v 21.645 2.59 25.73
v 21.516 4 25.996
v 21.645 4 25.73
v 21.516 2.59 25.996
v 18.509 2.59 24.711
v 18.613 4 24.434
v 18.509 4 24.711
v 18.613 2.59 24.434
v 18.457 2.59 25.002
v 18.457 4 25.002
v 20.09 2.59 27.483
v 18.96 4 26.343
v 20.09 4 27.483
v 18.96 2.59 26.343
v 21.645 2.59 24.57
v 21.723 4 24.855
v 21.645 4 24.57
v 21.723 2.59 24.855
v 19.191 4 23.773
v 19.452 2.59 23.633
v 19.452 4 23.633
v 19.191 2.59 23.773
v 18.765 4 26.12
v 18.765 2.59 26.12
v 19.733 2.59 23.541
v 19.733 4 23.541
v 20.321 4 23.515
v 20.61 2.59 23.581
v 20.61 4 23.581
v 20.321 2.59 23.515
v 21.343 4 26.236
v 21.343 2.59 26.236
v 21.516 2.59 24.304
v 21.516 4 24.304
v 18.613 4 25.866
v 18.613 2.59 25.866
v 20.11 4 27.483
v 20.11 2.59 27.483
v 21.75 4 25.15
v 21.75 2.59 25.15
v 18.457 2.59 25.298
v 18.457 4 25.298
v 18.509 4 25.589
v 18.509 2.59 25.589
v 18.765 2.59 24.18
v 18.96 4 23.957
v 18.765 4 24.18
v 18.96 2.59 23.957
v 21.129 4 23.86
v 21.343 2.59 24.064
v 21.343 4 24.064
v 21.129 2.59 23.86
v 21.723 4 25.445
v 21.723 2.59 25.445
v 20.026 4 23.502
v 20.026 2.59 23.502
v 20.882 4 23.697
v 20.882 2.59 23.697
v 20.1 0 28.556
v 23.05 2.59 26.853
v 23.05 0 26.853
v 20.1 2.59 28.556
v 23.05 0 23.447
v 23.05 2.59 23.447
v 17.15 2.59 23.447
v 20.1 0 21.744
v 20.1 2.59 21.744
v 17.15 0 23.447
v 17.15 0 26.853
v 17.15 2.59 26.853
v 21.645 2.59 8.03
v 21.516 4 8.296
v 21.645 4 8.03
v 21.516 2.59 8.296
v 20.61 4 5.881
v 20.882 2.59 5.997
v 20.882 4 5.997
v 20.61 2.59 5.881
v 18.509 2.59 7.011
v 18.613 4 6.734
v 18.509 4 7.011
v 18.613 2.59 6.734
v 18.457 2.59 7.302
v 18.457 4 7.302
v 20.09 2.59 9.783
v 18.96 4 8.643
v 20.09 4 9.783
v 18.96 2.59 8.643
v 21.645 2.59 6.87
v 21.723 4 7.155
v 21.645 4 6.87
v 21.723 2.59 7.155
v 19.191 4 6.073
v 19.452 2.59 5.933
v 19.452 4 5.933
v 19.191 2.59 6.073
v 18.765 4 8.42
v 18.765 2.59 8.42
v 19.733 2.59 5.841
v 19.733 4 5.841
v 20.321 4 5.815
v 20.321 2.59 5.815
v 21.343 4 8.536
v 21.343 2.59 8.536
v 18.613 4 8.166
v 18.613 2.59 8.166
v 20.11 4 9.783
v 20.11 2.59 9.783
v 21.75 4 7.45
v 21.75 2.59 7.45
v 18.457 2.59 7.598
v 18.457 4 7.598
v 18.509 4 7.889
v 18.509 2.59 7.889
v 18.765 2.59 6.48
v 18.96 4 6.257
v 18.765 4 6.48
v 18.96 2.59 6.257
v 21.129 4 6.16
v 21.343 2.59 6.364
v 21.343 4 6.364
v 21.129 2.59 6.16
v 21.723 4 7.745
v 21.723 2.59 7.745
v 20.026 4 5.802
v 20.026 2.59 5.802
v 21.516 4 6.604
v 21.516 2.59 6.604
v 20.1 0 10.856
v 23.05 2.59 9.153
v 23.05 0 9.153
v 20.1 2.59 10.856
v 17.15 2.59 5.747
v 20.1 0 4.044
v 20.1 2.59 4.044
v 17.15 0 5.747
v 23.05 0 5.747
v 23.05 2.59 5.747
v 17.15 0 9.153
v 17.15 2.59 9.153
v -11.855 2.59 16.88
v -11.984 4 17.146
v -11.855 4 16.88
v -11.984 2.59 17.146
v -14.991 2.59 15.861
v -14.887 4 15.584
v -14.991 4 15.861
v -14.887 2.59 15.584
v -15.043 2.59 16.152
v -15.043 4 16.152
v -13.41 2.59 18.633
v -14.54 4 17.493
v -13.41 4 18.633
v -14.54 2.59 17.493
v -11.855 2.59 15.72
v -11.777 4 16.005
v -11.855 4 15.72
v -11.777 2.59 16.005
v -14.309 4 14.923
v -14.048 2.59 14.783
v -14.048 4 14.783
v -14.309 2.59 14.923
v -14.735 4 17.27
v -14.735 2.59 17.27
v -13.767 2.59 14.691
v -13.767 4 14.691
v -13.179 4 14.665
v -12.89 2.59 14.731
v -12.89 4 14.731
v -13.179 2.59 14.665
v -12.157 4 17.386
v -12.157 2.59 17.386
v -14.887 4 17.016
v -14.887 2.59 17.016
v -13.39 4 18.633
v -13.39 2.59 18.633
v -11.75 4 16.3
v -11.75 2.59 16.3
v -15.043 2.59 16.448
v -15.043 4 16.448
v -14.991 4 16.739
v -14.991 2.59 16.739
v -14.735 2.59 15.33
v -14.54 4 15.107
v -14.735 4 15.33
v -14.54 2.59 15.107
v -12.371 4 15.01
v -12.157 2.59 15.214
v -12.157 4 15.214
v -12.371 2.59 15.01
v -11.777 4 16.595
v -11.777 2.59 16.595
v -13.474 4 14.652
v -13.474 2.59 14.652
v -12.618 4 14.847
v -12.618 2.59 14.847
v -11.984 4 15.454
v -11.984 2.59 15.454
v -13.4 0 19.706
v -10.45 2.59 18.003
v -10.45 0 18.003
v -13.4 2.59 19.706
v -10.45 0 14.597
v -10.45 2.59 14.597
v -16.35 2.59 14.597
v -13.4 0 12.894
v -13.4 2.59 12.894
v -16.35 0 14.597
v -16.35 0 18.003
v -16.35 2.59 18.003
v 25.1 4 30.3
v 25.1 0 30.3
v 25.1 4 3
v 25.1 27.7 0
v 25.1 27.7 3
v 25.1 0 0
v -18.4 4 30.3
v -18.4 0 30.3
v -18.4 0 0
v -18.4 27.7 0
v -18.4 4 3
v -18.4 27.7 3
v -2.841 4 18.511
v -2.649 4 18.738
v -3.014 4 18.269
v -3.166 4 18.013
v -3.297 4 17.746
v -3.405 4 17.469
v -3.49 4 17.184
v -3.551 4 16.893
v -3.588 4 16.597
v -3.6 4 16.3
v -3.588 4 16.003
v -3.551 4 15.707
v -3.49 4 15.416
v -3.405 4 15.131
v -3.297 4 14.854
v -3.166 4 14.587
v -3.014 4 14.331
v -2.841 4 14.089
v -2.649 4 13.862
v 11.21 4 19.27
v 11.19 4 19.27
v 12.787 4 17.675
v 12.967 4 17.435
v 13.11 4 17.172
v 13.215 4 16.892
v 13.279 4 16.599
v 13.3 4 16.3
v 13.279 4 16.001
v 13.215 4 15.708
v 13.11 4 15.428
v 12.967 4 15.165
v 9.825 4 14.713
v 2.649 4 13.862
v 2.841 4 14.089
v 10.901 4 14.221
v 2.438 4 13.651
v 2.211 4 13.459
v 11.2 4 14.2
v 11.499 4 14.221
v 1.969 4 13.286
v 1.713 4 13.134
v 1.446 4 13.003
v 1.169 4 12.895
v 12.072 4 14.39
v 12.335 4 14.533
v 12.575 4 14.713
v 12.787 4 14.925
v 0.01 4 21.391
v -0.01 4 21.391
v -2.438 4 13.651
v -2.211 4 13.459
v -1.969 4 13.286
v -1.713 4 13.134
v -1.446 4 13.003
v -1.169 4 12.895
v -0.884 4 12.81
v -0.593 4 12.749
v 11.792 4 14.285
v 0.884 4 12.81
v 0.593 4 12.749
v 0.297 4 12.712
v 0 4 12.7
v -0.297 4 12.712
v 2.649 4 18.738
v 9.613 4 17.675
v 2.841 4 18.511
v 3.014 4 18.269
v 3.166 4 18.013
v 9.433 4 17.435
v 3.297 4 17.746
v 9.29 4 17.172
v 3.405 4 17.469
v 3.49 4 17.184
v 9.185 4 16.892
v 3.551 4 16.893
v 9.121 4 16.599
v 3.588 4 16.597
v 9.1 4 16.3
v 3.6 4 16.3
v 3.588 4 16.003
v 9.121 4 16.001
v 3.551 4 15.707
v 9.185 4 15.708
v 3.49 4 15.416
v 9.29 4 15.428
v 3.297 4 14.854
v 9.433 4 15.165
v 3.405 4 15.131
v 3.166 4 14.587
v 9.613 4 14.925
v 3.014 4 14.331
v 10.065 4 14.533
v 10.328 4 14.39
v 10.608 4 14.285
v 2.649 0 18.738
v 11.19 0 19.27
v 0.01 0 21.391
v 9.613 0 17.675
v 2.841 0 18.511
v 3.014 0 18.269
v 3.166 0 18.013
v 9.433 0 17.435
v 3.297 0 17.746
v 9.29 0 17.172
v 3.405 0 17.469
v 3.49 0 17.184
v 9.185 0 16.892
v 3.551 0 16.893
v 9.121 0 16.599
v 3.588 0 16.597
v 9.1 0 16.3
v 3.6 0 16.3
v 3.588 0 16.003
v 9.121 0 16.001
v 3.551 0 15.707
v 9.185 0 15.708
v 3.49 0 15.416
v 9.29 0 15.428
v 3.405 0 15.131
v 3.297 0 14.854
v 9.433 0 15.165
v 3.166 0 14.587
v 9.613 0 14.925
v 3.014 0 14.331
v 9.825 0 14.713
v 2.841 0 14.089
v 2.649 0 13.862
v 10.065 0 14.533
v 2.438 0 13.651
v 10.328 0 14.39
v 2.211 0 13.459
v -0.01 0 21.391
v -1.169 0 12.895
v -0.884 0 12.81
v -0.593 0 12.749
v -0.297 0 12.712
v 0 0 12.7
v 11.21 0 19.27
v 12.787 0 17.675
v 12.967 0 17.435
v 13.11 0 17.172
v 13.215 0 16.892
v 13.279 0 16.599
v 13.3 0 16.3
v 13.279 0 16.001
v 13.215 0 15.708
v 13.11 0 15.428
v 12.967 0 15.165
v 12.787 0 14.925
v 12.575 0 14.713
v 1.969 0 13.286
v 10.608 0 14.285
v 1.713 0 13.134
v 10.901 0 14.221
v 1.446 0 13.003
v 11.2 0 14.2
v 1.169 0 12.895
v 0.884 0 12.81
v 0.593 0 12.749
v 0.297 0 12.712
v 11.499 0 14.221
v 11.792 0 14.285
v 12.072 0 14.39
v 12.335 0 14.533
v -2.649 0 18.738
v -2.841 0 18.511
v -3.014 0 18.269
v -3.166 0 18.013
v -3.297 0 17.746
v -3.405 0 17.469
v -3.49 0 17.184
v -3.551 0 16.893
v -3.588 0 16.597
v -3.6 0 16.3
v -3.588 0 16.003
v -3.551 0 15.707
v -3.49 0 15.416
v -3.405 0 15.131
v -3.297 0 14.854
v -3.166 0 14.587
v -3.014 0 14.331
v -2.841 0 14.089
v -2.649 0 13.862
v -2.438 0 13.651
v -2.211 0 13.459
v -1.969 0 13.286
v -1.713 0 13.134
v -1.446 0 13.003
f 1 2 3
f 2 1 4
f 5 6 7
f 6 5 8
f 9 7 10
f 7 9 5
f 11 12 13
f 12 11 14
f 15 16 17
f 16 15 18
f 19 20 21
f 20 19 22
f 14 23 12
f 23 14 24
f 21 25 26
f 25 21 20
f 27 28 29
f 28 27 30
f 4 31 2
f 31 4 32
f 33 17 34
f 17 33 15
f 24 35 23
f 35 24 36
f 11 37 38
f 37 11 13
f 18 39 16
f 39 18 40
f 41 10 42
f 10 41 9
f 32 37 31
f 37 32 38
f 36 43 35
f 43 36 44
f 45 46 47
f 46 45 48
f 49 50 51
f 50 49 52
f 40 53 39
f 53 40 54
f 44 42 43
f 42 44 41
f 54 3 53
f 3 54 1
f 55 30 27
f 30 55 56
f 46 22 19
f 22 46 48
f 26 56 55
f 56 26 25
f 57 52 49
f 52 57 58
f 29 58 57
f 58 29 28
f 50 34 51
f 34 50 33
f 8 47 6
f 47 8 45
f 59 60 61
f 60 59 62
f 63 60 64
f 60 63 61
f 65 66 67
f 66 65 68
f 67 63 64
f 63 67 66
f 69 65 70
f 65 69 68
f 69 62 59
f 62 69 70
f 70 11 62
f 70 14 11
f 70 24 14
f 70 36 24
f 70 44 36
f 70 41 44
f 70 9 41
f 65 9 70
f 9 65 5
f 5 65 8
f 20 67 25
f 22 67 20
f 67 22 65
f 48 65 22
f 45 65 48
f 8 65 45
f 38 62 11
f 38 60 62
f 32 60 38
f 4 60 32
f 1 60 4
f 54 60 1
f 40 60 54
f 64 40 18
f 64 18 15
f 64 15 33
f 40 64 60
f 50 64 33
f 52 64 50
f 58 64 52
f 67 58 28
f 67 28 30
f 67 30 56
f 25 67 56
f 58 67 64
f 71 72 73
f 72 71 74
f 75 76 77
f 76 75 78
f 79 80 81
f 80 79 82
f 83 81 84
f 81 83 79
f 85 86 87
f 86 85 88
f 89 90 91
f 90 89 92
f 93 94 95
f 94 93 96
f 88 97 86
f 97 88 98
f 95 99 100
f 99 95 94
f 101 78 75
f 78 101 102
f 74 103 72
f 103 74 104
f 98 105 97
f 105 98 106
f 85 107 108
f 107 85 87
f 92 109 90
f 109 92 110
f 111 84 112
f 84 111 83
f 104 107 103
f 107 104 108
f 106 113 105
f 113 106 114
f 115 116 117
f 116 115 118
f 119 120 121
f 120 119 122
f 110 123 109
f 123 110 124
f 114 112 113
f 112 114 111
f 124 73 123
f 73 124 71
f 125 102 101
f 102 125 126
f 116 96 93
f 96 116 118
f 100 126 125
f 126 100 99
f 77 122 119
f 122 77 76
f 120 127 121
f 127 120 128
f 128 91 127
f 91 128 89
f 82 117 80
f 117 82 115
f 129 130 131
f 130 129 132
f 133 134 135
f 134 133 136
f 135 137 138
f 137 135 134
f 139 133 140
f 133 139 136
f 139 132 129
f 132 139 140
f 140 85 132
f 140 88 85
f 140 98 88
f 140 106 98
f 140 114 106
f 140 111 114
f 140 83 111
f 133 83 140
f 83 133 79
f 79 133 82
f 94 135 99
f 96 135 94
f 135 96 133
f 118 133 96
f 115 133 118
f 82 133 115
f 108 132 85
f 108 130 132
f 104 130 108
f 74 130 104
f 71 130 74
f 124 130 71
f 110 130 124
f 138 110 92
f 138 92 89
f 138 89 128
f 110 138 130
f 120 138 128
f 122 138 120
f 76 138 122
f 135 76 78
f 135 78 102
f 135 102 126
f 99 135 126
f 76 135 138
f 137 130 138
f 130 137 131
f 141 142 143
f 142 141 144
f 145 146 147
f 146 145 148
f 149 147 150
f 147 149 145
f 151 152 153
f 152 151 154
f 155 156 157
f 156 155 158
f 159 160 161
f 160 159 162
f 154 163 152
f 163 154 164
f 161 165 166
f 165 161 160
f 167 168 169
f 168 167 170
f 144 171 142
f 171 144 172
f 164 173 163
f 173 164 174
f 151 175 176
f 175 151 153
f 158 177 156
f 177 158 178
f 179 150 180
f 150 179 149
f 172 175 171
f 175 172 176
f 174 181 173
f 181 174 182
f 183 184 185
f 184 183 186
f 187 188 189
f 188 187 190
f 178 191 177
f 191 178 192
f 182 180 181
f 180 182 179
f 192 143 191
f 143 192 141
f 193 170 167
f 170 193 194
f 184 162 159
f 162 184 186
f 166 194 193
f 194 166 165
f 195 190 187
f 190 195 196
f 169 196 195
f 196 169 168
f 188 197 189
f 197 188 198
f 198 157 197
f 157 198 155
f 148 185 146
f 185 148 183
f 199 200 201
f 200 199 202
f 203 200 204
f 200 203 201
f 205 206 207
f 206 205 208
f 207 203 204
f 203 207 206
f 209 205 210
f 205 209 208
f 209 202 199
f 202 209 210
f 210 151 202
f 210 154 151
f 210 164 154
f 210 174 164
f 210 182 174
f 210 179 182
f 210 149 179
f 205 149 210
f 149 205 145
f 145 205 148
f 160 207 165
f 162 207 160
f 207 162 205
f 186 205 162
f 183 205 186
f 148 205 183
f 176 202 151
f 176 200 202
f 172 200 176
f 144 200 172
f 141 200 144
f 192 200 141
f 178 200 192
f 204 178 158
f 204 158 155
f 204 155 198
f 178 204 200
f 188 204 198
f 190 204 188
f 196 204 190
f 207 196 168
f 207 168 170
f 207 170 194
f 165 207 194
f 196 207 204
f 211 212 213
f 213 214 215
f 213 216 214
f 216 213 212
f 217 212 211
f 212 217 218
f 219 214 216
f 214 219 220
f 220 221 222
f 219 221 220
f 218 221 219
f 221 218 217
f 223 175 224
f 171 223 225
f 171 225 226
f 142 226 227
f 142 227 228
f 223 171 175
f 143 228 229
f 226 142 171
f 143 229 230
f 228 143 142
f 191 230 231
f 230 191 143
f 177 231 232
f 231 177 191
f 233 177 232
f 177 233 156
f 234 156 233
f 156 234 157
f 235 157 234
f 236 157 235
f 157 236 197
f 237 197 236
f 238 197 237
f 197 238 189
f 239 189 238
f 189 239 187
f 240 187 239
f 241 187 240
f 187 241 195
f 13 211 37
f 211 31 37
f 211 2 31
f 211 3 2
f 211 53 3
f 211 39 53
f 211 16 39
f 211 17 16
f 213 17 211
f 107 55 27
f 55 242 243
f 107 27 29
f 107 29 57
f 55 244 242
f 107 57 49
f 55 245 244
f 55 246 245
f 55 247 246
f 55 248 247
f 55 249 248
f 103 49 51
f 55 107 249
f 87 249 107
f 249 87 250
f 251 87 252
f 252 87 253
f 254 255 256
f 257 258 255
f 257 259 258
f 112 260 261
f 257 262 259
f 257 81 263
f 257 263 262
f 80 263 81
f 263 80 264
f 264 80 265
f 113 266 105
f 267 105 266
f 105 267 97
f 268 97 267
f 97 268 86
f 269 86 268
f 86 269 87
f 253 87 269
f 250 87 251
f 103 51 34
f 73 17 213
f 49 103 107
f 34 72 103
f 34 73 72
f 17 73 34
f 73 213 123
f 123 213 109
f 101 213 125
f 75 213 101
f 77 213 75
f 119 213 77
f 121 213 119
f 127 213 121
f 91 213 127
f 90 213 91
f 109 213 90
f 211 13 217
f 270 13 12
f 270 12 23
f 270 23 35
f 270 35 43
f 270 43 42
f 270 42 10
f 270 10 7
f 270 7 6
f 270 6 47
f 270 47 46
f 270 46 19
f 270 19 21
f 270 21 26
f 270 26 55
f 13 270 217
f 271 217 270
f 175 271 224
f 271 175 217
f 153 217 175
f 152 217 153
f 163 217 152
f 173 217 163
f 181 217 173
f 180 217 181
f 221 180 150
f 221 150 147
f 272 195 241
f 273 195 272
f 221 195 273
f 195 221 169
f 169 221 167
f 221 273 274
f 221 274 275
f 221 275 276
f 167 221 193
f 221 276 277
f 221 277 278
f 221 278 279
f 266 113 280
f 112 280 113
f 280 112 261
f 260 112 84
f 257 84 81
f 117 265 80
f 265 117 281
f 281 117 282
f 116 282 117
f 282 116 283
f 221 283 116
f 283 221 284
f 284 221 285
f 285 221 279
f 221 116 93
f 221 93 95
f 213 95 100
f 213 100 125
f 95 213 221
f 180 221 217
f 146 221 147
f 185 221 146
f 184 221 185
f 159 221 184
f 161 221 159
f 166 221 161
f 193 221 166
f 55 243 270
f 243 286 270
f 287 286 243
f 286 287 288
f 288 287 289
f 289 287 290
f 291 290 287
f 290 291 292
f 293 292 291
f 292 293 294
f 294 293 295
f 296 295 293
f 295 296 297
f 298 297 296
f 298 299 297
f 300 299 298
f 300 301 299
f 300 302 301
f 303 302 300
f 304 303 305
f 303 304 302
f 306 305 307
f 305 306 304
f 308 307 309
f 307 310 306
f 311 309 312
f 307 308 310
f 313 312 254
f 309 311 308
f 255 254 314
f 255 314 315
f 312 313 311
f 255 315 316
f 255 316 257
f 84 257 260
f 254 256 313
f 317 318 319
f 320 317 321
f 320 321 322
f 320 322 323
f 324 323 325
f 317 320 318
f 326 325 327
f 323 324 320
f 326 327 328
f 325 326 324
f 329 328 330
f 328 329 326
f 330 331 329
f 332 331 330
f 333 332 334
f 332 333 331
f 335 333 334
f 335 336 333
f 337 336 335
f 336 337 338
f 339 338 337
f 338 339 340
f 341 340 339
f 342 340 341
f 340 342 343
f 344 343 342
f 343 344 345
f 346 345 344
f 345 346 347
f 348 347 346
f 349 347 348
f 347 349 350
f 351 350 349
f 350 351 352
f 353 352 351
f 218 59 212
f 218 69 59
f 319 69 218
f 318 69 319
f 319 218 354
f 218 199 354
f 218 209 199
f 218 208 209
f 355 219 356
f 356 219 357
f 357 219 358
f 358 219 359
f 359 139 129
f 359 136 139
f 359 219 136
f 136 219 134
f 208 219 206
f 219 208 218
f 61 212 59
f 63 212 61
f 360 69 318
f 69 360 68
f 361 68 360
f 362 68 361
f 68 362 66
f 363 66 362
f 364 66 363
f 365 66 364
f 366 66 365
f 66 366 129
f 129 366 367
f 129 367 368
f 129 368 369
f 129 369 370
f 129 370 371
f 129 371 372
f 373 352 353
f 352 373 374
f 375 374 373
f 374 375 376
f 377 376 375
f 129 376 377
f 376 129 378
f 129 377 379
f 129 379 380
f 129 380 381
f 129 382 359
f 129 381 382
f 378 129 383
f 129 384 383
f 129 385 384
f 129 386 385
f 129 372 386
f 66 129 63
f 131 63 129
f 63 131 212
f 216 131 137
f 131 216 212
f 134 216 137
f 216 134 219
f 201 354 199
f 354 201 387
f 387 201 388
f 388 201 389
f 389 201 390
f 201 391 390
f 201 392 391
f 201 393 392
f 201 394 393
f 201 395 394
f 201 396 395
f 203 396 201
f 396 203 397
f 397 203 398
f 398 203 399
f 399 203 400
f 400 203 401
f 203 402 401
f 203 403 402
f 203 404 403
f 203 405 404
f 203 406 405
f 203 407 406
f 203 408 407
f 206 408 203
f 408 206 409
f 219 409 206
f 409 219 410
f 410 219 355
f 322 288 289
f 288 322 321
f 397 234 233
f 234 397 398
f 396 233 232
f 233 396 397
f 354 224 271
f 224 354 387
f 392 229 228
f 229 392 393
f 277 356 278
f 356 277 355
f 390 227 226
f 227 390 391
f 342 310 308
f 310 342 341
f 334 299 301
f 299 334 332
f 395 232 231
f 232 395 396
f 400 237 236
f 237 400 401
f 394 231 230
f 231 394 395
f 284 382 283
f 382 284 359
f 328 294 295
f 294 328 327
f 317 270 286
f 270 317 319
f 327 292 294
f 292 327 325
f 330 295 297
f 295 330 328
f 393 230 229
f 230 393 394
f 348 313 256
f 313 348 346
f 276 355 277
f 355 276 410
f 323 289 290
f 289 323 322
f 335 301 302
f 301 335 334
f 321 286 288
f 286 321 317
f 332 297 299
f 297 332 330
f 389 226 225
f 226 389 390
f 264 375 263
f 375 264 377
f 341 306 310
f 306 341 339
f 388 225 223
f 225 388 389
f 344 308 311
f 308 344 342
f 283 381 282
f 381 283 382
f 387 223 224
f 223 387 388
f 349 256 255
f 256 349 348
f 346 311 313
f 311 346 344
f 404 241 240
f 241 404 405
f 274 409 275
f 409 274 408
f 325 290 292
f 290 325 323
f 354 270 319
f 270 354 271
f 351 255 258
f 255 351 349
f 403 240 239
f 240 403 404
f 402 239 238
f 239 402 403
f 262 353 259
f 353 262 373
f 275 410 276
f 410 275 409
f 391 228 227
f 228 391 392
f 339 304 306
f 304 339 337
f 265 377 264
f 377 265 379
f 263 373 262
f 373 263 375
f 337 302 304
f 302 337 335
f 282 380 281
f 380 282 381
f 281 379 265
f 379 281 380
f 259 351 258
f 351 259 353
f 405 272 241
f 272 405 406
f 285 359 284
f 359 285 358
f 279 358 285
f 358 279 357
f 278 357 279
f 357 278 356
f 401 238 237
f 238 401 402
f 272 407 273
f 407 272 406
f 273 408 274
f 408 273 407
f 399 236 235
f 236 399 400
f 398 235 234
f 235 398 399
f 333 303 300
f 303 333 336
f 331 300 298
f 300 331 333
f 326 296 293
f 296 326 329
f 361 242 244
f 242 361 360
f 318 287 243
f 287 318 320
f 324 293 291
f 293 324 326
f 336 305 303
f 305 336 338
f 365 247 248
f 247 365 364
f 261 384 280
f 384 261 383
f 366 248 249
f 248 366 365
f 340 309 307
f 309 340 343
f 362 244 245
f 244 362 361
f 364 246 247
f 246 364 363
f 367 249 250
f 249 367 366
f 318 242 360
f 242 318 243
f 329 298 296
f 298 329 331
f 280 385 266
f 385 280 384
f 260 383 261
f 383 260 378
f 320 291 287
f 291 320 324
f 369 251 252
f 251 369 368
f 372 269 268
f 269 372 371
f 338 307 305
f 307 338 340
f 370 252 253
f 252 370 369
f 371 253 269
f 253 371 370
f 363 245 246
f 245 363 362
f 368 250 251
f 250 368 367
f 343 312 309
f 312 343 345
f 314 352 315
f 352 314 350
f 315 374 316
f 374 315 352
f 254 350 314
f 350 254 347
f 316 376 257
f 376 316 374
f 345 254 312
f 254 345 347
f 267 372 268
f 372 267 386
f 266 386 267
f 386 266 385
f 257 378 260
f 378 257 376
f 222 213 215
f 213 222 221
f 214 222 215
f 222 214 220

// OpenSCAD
// file: ../vehicle/barrel.scad
// IR gun barrel: thick-wall tube, LED seated coaxially at the rear, held by a rear cap.
// Modeled in print orientation: axis on Z, muzzle on the bed at z = 0, rear at z = len.
// The LED goes in from the rear, its flange stops on a step, and the cap presses it there.

include <../lib/common.scad>
include <../lib/parts.scad>

barrel_len = 60;
barrel_bore_d = 5.0;
barrel_od = 14;
barrel_cap_d = 9;
barrel_cap_h = 3;
barrel_wire_slot = [4.0, 2.0];

function barrel_od() = barrel_od;

// Longer than the LED body so the flange, not the dome, is the stop.
led_seat_len = led_h - led_flange_h + 0.5;

module barrel(len = barrel_len, bore_d = barrel_bore_d, od = barrel_od, seat_cl = clearance) {
    assert(od - barrel_cap_d >= 2 * wall_min, "barrel wall around the cap is too thin");
    assert(len > barrel_cap_h + led_flange_h + led_seat_len + 5, "barrel too short for the LED seat");
    difference() {
        cylinder(d = od, h = len);
        barrel_bore(len, bore_d, seat_cl);
    }
}

// Kept separate so baffles or a muzzle aperture can be added here later.
module barrel_bore(len, bore_d, seat_cl) {
    flange_z = len - barrel_cap_h - led_flange_h;
    hole(bore_d, len, cl = 0);
    translate([0, 0, flange_z - led_seat_len]) cylinder(d = led_d + seat_cl, h = led_seat_len + eps);
    translate([0, 0, flange_z]) cylinder(d = led_flange_d + seat_cl, h = led_flange_h + eps);
    translate([0, 0, len - barrel_cap_h]) cylinder(d = barrel_cap_d + clearance, h = barrel_cap_h + eps);
}

// Printed flat side down; that face presses on the LED flange.
module barrel_cap() {
    difference() {
        cylinder(d = barrel_cap_d, h = barrel_cap_h);
        translate([0, 0, barrel_cap_h / 2])
            cube([barrel_wire_slot.x, barrel_wire_slot.y, barrel_cap_h + 1], center = true);
    }
}

barrel();
translate([barrel_od + 5, 0, 0]) barrel_cap();
// file: ../lib/pcb_vehicle.scad
// Generated by shield/tools/brd2scad.py from eagle/ir_remote_controlled_veh.brd. Do not edit; run `make pcb`.
// Units mm. Origin = lower-left corner of the board outline. +Y = Eagle +Y.

pcb_vehicle_eagle_origin = [-2.54, -3.81];
pcb_vehicle_size = [98.73, 99.558];
pcb_vehicle_outline = [[0, 0], [98.73, 0], [98.73, 99.558], [0, 99.558]];

// [name, x, y, drill]
pcb_vehicle_holes = [
  ["H1", 90.17, 91.44, 2.8],
  ["H2", 7.62, 10.16, 2.8],
];

// [name, package, value, x, y, rot, mirrored, [x0, y0, x1, y1] footprint box]
pcb_vehicle_parts = [
  ["7SEG", "BA56-12EWA", "", 77.47, 80.01, 0, false, [66.358, 71.438, 89.853, 83.503]],
  ["B1", "KEYSTONE_1049_DUAL_18650_HOLDER", "KEYSTONE_DUAL_18650_BATTERY_HOLDER", 53.721, 20.955, 0, false, [15.091, 0.955, 92.351, 40.955]],
  ["BATTERY", "LED5MM", "", 63.5, 49.53, 90, false, [60.884, 46.914, 66.116, 52.197]],
  ["C1", "C025-040X050", "22uF", 13.97, 90.17, 90, false, [11.989, 87.681, 15.951, 92.659]],
  ["IC1", "DIL14", "74ALS08N", 52.07, 91.44, 0, false, [43.104, 86.919, 61.036, 95.961]],
  ["IC2", "DIL16", "74HC595N", 77.47, 60.96, 180, false, [67.234, 56.439, 87.706, 65.481]],
  ["IC3", "DIL16", "L293D", 19.05, 67.31, 270, false, [14.529, 57.074, 23.571, 77.546]],
  ["IR", "LED5MM", "", 55.88, 60.96, 0, false, [53.264, 58.344, 58.547, 63.576]],
  ["NRF24L", "NRF24L01+", "NRF24L01+", 22.86, 102.87, 90, false, [17.082, 89.471, 32.449, 118.809]],
  ["R1", "0204/7", "180", 54.61, 68.58, 0, false, [50.089, 67.488, 59.131, 69.672]],
  ["R2", "0204/7", "180", 54.61, 71.12, 0, false, [50.089, 70.028, 59.131, 72.212]],
  ["R3", "0204/7", "180", 54.61, 73.66, 0, false, [50.089, 72.568, 59.131, 74.752]],
  ["R4", "0204/7", "30K", 17.78, 52.07, 0, false, [13.259, 50.978, 22.301, 53.162]],
  ["R5", "0204/7", "30K", 17.78, 48.26, 0, false, [13.259, 47.168, 22.301, 49.352]],
  ["R6", "0204/7", "160", 53.34, 50.8, 0, false, [48.819, 49.708, 57.861, 51.892]],
  ["R7", "0204/7", "160", 53.34, 55.88, 0, false, [48.819, 54.788, 57.861, 56.972]],
  ["R8", "0204/7", "100", 53.34, 53.34, 0, false, [48.819, 52.248, 57.861, 54.432]],
  ["S1", "TL3XPO", "TL38PO", 10.16, 31.75, 270, false, [7.518, 26.568, 12.802, 36.932]],
  ["SG1", "F/CM12P", "F/CM12P", 88.9, 49.53, 270, false, [81.839, 42.469, 95.961, 56.591]],
  ["SV1", "MA04-1", "", 7.62, 80.01, 270, false, [6.274, 74.854, 8.966, 85.166]],
  ["TSOP1", "TSOP17XX", "TSOP1730", 68.58, 95.25, 180, false, [63.597, 93.281, 73.724, 97.409]],
  ["TSOP2", "TSOP17XX", "TSOP1730", 68.58, 90.17, 0, false, [63.437, 88.011, 73.564, 92.139]],
  ["U$1", "NANO", "", 40.64, 54.61, 0, false, [29.769, 45.009, 46.431, 81.991]],
];
// file: ../vehicle/gun_block.scad
// Gun block: raked block with the barrel bore, the TSOP pair seat on top and the wall
// as its rear part. Modeled in assembly orientation: x = 0 on the barrel axis, y = 0
// at the wall rear face, z = 0 on the base plate top. Printed on the wall rear face,
// so the barrel bore is vertical and round.
// The barrel slides in from the front until its rear end is flush with the wall rear
// face (press the block rear on the table). It is held by friction (barrel_fit_cl).

include <../lib/common.scad>
include <../lib/parts.scad>
use <barrel.scad>

// As wide as the caster spacer below the plate, so the two read as one nose.
block_w = caster_plate.x;
block_h = 40;
// Flat top for the TSOP pair, from the wall rear face; the front face leans back by block_rake.
block_top_len = 20;
block_rake = 30;
// Wall: full plate width, sides sloping down to wall_side_h.
wall_w = 100;
wall_t = 4;
wall_side_h = 15;
// Foot on the plate for the M3 screws; nuts go under the base plate.
flange_t = 3;
flange_len = 12;
flange_front_w = 84;
flange_hole_x = [25, 40];
flange_hole_y = 8;
barrel_axis_z = 15;
barrel_fit_cl = 0.2;
tsop = tsop1730;
tsop_seat_depth = 5;
// Under the lens ends of the pair; the bodies rest on it, the legs go down between.
tsop_ledge = 2;
// [width, height] of the wire channel from the TSOP legs out of the wall rear face.
tsop_wire_channel = [6, 5];
// Dome radius is 2.75; the whole lens must stay above the block top.
min_lens_above_top = 3.5;

block_len = block_top_len + block_h * tan(block_rake);
bore_d = barrel_od() + barrel_fit_cl;
tsop_y = block_top_len / 2;
tsop_floor_z = block_h - tsop_seat_depth;
wire_z = barrel_axis_z + bore_d / 2 + wall_min;

function gun_block_len() = block_len;
function gun_block_wall_w() = wall_w;
function gun_block_wall_t() = wall_t;
function gun_block_barrel_z() = barrel_axis_z;
function gun_block_tsop_seat() = [0, tsop_y, tsop_floor_z];
function gun_block_holes() = [for (sx = [-1, 1], x = flange_hole_x) [sx * x, flange_hole_y]];

assert(tsop_lens_h(tsop) - tsop_seat_depth >= min_lens_above_top, "TSOP seat too deep, lens would be covered");
assert(tsop_y + (2 * tsop_depth(tsop) + clearance) / 2 + wall_min <= block_top_len, "TSOP pocket does not fit the flat top");
assert(bore_d + 2 * wall_min <= block_w, "block too narrow for the barrel");
assert(barrel_axis_z - bore_d / 2 >= wall_min, "barrel bore too low");
assert(wire_z + tsop_wire_channel.y <= tsop_floor_z - wall_min, "no room for the TSOP wires above the barrel");
echo(block_len = block_len, tsop_legs_max = tsop_floor_z - wire_z, lens_above_top = tsop_lens_h(tsop) - tsop_seat_depth);

// Top face at z = 0, pair centred on the origin, legs straight down into the cavity.
module tsop_seat_cut(t = tsop, depth = tsop_seat_depth, cavity_h = 10, ledge = tsop_ledge) {
    pocket = [tsop_w(t) + clearance, 2 * tsop_depth(t) + clearance];
    cavity = [pocket.x, pocket.y - 2 * ledge];
    assert(tsop_pin_back(t) + 0.5 <= cavity.y / 2, "ledge covers the legs");
    translate([-pocket.x / 2, -pocket.y / 2, -depth]) cube([pocket.x, pocket.y, depth + eps]);
    translate([-cavity.x / 2, -cavity.y / 2, -depth - cavity_h]) cube([cavity.x, cavity.y, cavity_h + eps]);
}

module gun_block() {
    difference() {
        union() {
            hull() {
                translate([-block_w / 2, 0, 0]) cube([block_w, block_len, eps]);
                translate([-block_w / 2, 0, block_h - eps]) cube([block_w, block_top_len, eps]);
            }
            translate([0, wall_t, 0]) rotate([90, 0, 0]) linear_extrude(wall_t) polygon([
                [-wall_w / 2, 0], [wall_w / 2, 0], [wall_w / 2, wall_side_h],
                [block_w / 2, block_h], [-block_w / 2, block_h], [-wall_w / 2, wall_side_h],
            ]);
            linear_extrude(flange_t) polygon([
                [-wall_w / 2, 0], [wall_w / 2, 0], [wall_w / 2, wall_t],
                [flange_front_w / 2, flange_len], [-flange_front_w / 2, flange_len], [-wall_w / 2, wall_t],
            ]);
        }
        translate([0, -eps, barrel_axis_z]) rotate([-90, 0, 0]) cylinder(d = bore_d, h = block_len + 2 * eps);
        translate([0, tsop_y, block_h]) tsop_seat_cut(cavity_h = tsop_floor_z - wire_z);
        translate([-tsop_wire_channel.x / 2, -eps, wire_z]) cube([tsop_wire_channel.x, tsop_y + eps, tsop_wire_channel.y]);
        // Teardrop tip points +Y, which is up when printed on the wall rear face.
        for (sx = [-1, 1], x = flange_hole_x)
            translate([sx * x, flange_hole_y, flange_t]) rotate([-90, 0, 0]) teardrop(m3_d, flange_t, m3_cl);
    }
}

rotate([90, 0, 0]) gun_block();
// file: ../lib/vehicle_layout.scad
// Vehicle layout shared by the vehicle parts and the preview. Values only, no geometry.
// PCB coordinates: origin at the PCB outline lower-left corner, +Y front, z = 0 on the
// base plate top.

include <common.scad>
include <parts.scad>
include <pcb_vehicle.scad>
use <../vehicle/gun_block.scad>

// The barrel sticks out in front of the plate, so only the plate is limited (by the bed).
plate_size = [100, 170];
plate_x0 = (pcb_vehicle_size.x - plate_size.x) / 2;
// Shorter than on the prototype (48) so the nose starts in front of the gun block wall.
nose_len = 39;
// Motor wall length past the outer motor holes.
motor_wall_margin = 5;
// As far back as it goes with the motor walls ending at the plate rear edge.
axle_y = motor_wall_margin - tt_holes[2][0];
// Front face of the caster spacer leans back going down, as on the prototype.
caster_spacer_rake = 30;
// Gun block wall rear face must stay in front of the NRF24 module.
nrf_gap = 1.0;

// PCB rests at the two corners without holes (no solder joints there), mirrored from H1 and H2.
// [diameter, length] of the rest peg that locates it in the plate.
pcb_rest_peg = [3, 2];

centre_x = plate_x0 + plate_size.x / 2;
pcb_rest_points = [
    [pcb_vehicle_holes[0][1], pcb_vehicle_holes[1][2]],
    [pcb_vehicle_holes[1][1], pcb_vehicle_holes[0][2]],
];
// The gun block on top and the caster spacer below both end at the plate front edge, as a
// nose; the plate front is as wide as both.
nose_front_w = caster_plate.x;
block_y = plate_size.y - gun_block_len();
caster_y = plate_size.y - caster_spacer_h * tan(caster_spacer_rake) - caster_plate.y / 2;

assert(block_y >= pcb_part(pcb_vehicle_parts, "NRF24L")[7][3] + nrf_gap, "gun block wall hits the NRF24 module");
// file: ../vehicle/base_plate.scad
// Vehicle base plate with the TT motor walls and the caster spacer in one piece.
// Modeled in assembly orientation (see lib/vehicle_layout.scad). Printed top face down, so the
// motor walls and the caster spacer grow up from the bed without supports.
// PCB and gun block: M3 screws from the top, nuts in traps in the plate bottom.
// PCB standoffs and rests are separate (pcb_standoff.scad); the rests sit in blind holes.
// Caster: self-tapping screws from below into blind pilot holes in the spacer.

include <../lib/vehicle_layout.scad>
use <gun_block.scad>

motor_wall_t = 4;
// [x, y] size of the motor wire slots, in front of the PCB, in line with each motor.
wire_slot = [5, 10];
wire_slot_y = 104;
// For the 10 mm caster screws (user value).
caster_pilot_d = 2;
caster_pilot_depth = 10;
// A thin ring slit around each pilot hole makes the slicer print walls on both sides of
// it, so the screw bites into solid plastic instead of infill.
caster_slit_r = caster_pilot_d / 2 + 1.6;
caster_slit_w = 0.15;

motor_wall_h = motor_top_gap + tt_w + 3;

// Motor wall in its own frame, the same as test/tt_motor_mount: x along the motor from
// the shaft towards the motor end, wall at y 0..motor_wall_t with the motor on +Y and
// the nuts on -Y, z = 0 on the plate top and growing down into the plate and the wall.
module tt_motor_wall() {
    x0 = tt_holes[2][0] - motor_wall_margin;
    x1 = tt_holes[0][0] + motor_wall_margin;
    shaft_z = base_plate_t + motor_top_gap + tt_top_above_axle;
    difference() {
        translate([x0, 0, 0]) cube([x1 - x0, motor_wall_t, base_plate_t + motor_wall_h]);
        for (h = tt_holes) translate([h[0], 0, shaft_z + h[1]]) {
            teardrop(m3_d, motor_wall_t, m3_cl);
            translate([0, -eps, 0]) rotate([-90, 0, 0]) nut_trap(m3_nut_af, m3_nut_h + clearance, m3_nut_cl);
        }
        translate([0, 0, shaft_z]) teardrop(tt_boss_d + 1.5, motor_wall_t);
        translate([tt_peg[0], 0, shaft_z + tt_peg[1]]) teardrop(tt_peg_d, motor_wall_t);
    }
}

module plate_outline() {
    nose_y = plate_size.y - nose_len;
    polygon([
        [0, 0], [plate_size.x, 0], [plate_size.x, nose_y],
        [(plate_size.x + nose_front_w) / 2, plate_size.y],
        [(plate_size.x - nose_front_w) / 2, plate_size.y], [0, nose_y],
    ]);
}

// As long as the gun block above, so the two read as one nose. Top at z = 0 (plate
// underside), caster face at z = -caster_spacer_h.
caster_spacer_nose = caster_spacer_h * tan(caster_spacer_rake);
module caster_spacer() {
    hull() {
        translate([-caster_plate.x / 2, block_y, -caster_spacer_h]) cube([caster_plate.x, plate_size.y - caster_spacer_nose - block_y, eps]);
        translate([-caster_plate.x / 2, block_y, -eps]) cube([caster_plate.x, plate_size.y - block_y, eps]);
    }
}

function caster_holes() = [for (sx = [-1, 1], sy = [-1, 1])
    [centre_x + sx * caster_hole_spacing.x / 2, caster_y + sy * caster_hole_spacing.y / 2]];

module caster_screw_cut(p) {
    translate([p.x, p.y, -base_plate_t - caster_spacer_h]) {
        hole(caster_pilot_d, caster_pilot_depth, 0);
        difference() {
            hole(2 * caster_slit_r + caster_slit_w, caster_pilot_depth, 0);
            hole(2 * caster_slit_r - caster_slit_w, caster_pilot_depth, eps);
        }
    }
}

module bottom_nut_trap(x, y) {
    translate([x, y, -base_plate_t]) {
        hole(m3_d, base_plate_t, m3_cl);
        nut_trap(m3_nut_af, base_plate_t - nut_roof, m3_nut_cl);
    }
}

module base_plate() {
    difference() {
        union() {
            translate([plate_x0, 0, -base_plate_t]) linear_extrude(base_plate_t) plate_outline();
            for (side = [-1, 1]) {
                inner_x = side < 0 ? plate_x0 + tt_t + motor_wall_t : plate_x0 + plate_size.x - tt_t - motor_wall_t;
                multmatrix([[0, side, 0, inner_x], [1, 0, 0, axle_y], [0, 0, -1, 0]]) tt_motor_wall();
            }
            translate([centre_x, 0, -base_plate_t]) caster_spacer();
        }
        for (h = pcb_vehicle_holes) bottom_nut_trap(h[1], h[2]);
        for (p = pcb_rest_points) translate([p.x, p.y, -pcb_rest_peg[1] - 0.5])
            cylinder(d = pcb_rest_peg[0] + clearance, h = pcb_rest_peg[1] + 0.5 + eps);
        for (p = gun_block_holes()) bottom_nut_trap(centre_x + p.x, block_y + p.y);
        for (p = caster_holes()) caster_screw_cut(p);
        for (x = [plate_x0 + tt_t / 2, plate_x0 + plate_size.x - tt_t / 2])
            translate([x - wire_slot.x / 2, wire_slot_y, -base_plate_t - eps]) cube([wire_slot.x, wire_slot.y, base_plate_t + 2 * eps]);
    }
}

assert(plate_size.x <= bed_size.x && plate_size.y <= bed_size.y, "plate larger than the bed");
assert(gun_block_wall_w() <= plate_size.x, "gun block wall wider than the plate");
assert(plate_size.y - nose_len >= block_y + gun_block_wall_t(), "plate nose cuts under the gun block wall");
assert(caster_y - caster_plate.y / 2 >= block_y, "caster plate overhangs the spacer rear end");
assert(block_y + gun_block_len() <= plate_size.y, "gun block overhangs the plate front");
assert(wire_slot_y > pcb_vehicle_size.y && wire_slot_y + wire_slot.y < block_y, "wire slot not between the PCB and the gun block");
assert(caster_pilot_depth <= caster_spacer_h + base_plate_t - 1, "caster pilot hole breaks through the plate top");
echo(caster_screw_max = caster_plate_t + caster_pilot_depth, caster_slit_d = 2 * caster_slit_r);
echo(plate_underside_h = plate_underside_h, caster_spacer_h = caster_spacer_h, motor_wall_h = motor_wall_h);

rotate([180, 0, 0]) base_plate();
// file: ../lib/parts.scad
// Off-the-shelf part sizes and simple ghost models for previews. Units mm.
// docs/measurements.md is the source of truth for every value here, with its source
// and status. Change both together. "unverified" values are not final.

// Mounted with the long axis horizontal and the 22.3 width vertical.
// Local frame of tt_motor_ghost(): shaft on the X axis, gearbox end towards -Y.
tt_len = 64.4;
tt_w = 22.3;
tt_clip_w = 22.6;
tt_t = 18.7;
tt_shaft_from_end = 11.0;
tt_shaft_d = 5.4;
tt_shaft_len = 9.1;
tt_boss_d = 5.5;
tt_hole_d = 2.8;
// [along length from shaft, across width from shaft]
tt_holes = [[20.1, 8.85], [20.1, -8.85], [-13.4, 0]];
tt_tab_len = 5.0;
tt_tab_w = 5.7;
// Round peg on the gearbox side, estimated from the drawing scale.
tt_peg = [11.2, 0];
tt_peg_d = 4.0;
tt_top_above_axle = max(tt_w, tt_clip_w) / 2;

wheel_d = 65;
wheel_w = 26;

caster_h = 35;
caster_wheel_d = 25;
caster_hole_d = 5;
caster_hole_spacing = [28, 23];
caster_plate = [40, 34];
caster_plate_t = 2;

// Plate underside height; the caster must reach the same height. Recompute after
// measuring wheel_d, tt_top_above_axle, motor_top_gap and caster_h.
// On the prototype an aluminium angle flange sits between plate and motor (photo
// estimate). The gap also keeps the top motor nut trap clear of the plate.
motor_top_gap = 2;
plate_underside_h = wheel_d / 2 + tt_top_above_axle + motor_top_gap;
caster_spacer_h = plate_underside_h - caster_h;

led_d = 5.0;
led_flange_d = 5.8;
led_flange_h = 1.0;
led_h = 8.6;
led_lead_pitch = 2.54;

// IR receivers: [body w, body h, depth incl. lens, lens centre above body bottom,
//     outer pin spacing, pins from back face]
tsop1730 = [10.0, 12.5, 5.8, 9.2, 7.62, 1.4];
// Upgrade option only (docs/hardware-upgrades.md). Lens height and pin offset are guesses.
tsop38238 = [5.0, 6.95, 4.8, 4.5, 5.08, 1.0];
function tsop_w(t) = t[0];
function tsop_h(t) = t[1];
function tsop_depth(t) = t[2];
function tsop_lens_h(t) = t[3];
function tsop_pin_span(t) = t[4];
function tsop_pin_back(t) = t[5];

btn_hole_d = 24;
btn_bezel_d = 30;
btn_above_panel = 10;
btn_depth = 33;
btn_nut_d = 30;

switch_body = [8.6, 3.6, 3.5];
switch_lever = [2.0, 2.0, 4.0];
switch_travel = 2.0;

cell_d = 18.5;
cell_len = 65.2;

joystick_cap_top = 32;
joystick_cap_d = 25;

// Height above the PCB top per Eagle package, for previews and clearance.
pcb_part_heights = [
    ["KEYSTONE_1049_DUAL_18650_HOLDER", 20],
    ["SINGLE_18650_HOLDER", 20],
    ["NRF24L01+", 13],
    ["NANO", 11],
    ["BA56-12EWA", 8],
    ["DIL14", 7],
    ["DIL16", 7],
    ["F/CM12P", 9.5],
    ["JOYSTICK-2AXIS-BUTTON", 17],
    ["DC-DC-STEP-UP-5V", 7],
    ["TL3XPO", 3.5],
];
function pcb_part_height(package) =
    let(i = search([package], pcb_part_heights)[0])
    is_num(i) ? pcb_part_heights[i][1] : 3;

module tt_motor_ghost() {
    color("gold") {
        translate([-tt_t / 2, -tt_shaft_from_end, -tt_w / 2]) cube([tt_t, tt_len, tt_w]);
        translate([0, -tt_shaft_from_end - tt_tab_len, 0])
            cube([3, 2 * tt_tab_len, tt_tab_w], center = true);
    }
    color("white") rotate([0, 90, 0])
        cylinder(d = tt_shaft_d, h = tt_t + 2 * tt_shaft_len, center = true);
}

module wheel_ghost() {
    color("dimgray") rotate([0, 90, 0]) cylinder(d = wheel_d, h = wheel_w, center = true);
}

// Top of the mounting plate at z = 0, wheel on the ground at z = -caster_h.
module caster_ghost() {
    color("white") {
        translate([0, 0, -caster_plate_t / 2]) cube([caster_plate.x, caster_plate.y, caster_plate_t], center = true);
        translate([0, 0, -caster_h + caster_wheel_d / 2]) rotate([0, 90, 0])
            cylinder(d = caster_wheel_d, h = 10, center = true);
        translate([-8, -4, -caster_h + caster_wheel_d / 2]) cube([16, 8, caster_h - caster_wheel_d / 2]);
    }
}

// Body bottom at z = 0, lens facing +Y.
module tsop_ghost(t = tsop1730) {
    color("black") translate([-tsop_w(t) / 2, 0, 0]) cube([tsop_w(t), tsop_depth(t), tsop_h(t)]);
    color("red") translate([0, tsop_depth(t), tsop_lens_h(t)]) sphere(1);
}

// Two receivers glued back to back, as on the prototype: one lens +Y, one -Y.
module tsop_pair_ghost(t = tsop1730) {
    tsop_ghost(t);
    rotate([0, 0, 180]) tsop_ghost(t);
}

// Flange bottom at z = 0, pointing +Z.
module led_ghost() {
    color("lightblue") {
        cylinder(d = led_flange_d, h = led_flange_h);
        cylinder(d = led_d, h = led_h - led_d / 2);
        translate([0, 0, led_h - led_d / 2]) sphere(d = led_d);
    }
}

// Panel front face at z = 0, button pointing +Z.
module arcade_button_ghost() {
    color("crimson") cylinder(d = btn_bezel_d, h = btn_above_panel);
    color("gray") translate([0, 0, -btn_depth]) cylinder(d = btn_hole_d - 1, h = btn_depth);
}

// PCB from a generated pcb_*.scad table with footprint boxes as part ghosts.
// Bottom of the PCB at z = 0. Parts named in flat_parts are only wire connection
// points on this PCB (the real part sits elsewhere) and are drawn flat.
module pcb_ghost(outline, holes, parts, flat_parts = []) {
    color("darkgreen") difference() {
        linear_extrude(pcb_thickness) polygon(outline);
        for (h = holes) translate([h[1], h[2], 0]) hole(h[3], pcb_thickness, cl = 0);
    }
    for (p = parts) {
        box = p[7];
        h = is_num(search([p[0]], flat_parts)[0]) ? 0.3 : pcb_part_height(p[1]);
        color(h > 15 ? "black" : "steelblue", 0.8)
            translate([box[0], box[1], pcb_thickness]) cube([box[2] - box[0], box[3] - box[1], h]);
    }
}
// file: ../lib/common.scad
// Shared print, fastener and helper definitions. Units mm.

$fa = 4;
$fs = 0.3;

eps = 0.01;

// Added to the diameter of holes, seats and press fits. Tune after the test prints.
clearance = 0.2;
wall_min = 1.6;
layer_h = 0.2;
bed_size = [180, 180, 180];

pcb_thickness = 1.6;
base_plate_t = 3;
// Under the PCB for through-hole leads and solder. Set from the vehicle PCB, see docs/measurements.md.
pcb_standoff_h = 2;

// ISO 4032 nuts, nominal.
m3_d = 3;
m3_nut_af = 5.5;
m3_nut_h = 2.4;
// From test/m3_fit (screw hole column 3, nut trap column 4).
m3_cl = 0.3;
m3_nut_cl = 0.4;
// Plate left above a nut trapped in the base plate bottom, so the nut does not pull
// through; the nut sticks out below the plate by the rest.
nut_roof = 1;

label_font = "Liberation Sans:style=Bold";

// Vertical hole from z = 0 to z = h.
module hole(d, h, cl = clearance) {
    translate([0, 0, -eps]) cylinder(d = d + cl, h = h + 2 * eps);
}

// Hex pocket from z = 0 to z = h, two flats parallel to X.
module nut_trap(af, h, cl = clearance) {
    translate([0, 0, -eps]) rotate([0, 0, 30])
        cylinder(d = (af + cl) / cos(30), h = h + eps, $fn = 6);
}

// Hole along +Y from y = 0 to y = h with a 45 deg roof pointing +Z,
// so it prints without support when the part's +Z is up on the printer.
module teardrop(d, h, cl = clearance) {
    r = (d + cl) / 2;
    rotate([90, 0, 0]) translate([0, 0, -h - eps])
        linear_extrude(h + 2 * eps) hull() {
            circle(r);
            translate([0, r * sqrt(2) - eps]) square(2 * eps, center = true);
        }
}

// Engraved label, top face at z = 0.
module label(txt, size = 4, depth = 0.6) {
    translate([0, 0, -depth]) linear_extrude(depth + eps)
        text(txt, size = size, font = label_font, halign = "center", valign = "center");
}

// Row from the generated pcb_*.scad parts table by element name.
function pcb_part(parts, name) = parts[search([name], parts)[0]];
// main file
// TT motor wall: a piece of base plate with one wall for one motor, the same wall as in
// vehicle/base_plate.scad.
// Print orientation: plate on the bed, wall up. In use it is upside down: the wall hangs
// under the plate and the motor top touches the plate underside (+ motor_top_gap).
// As on the prototype, the wall is inboard of the motor: the motor sits on the +Y face
// (outboard), M3 nuts go in traps on the -Y face (inboard).
// Hole, peg and shaft positions are from the drawing and unverified; this print checks them.

include <../lib/common.scad>
include <../lib/parts.scad>
use <../vehicle/base_plate.scad>

wall_t = 4;
margin = 5;
x0 = tt_holes[2][0] - margin;
x1 = tt_holes[0][0] + margin;
plate = [x1 - x0, wall_t + tt_t + 5, base_plate_t];
shaft_z = plate.z + motor_top_gap + tt_top_above_axle;

translate([x0, 0, 0]) cube(plate);
tt_motor_wall();

%translate([0, wall_t + tt_t / 2, shaft_z]) rotate([0, 0, -90]) tt_motor_ghost();
